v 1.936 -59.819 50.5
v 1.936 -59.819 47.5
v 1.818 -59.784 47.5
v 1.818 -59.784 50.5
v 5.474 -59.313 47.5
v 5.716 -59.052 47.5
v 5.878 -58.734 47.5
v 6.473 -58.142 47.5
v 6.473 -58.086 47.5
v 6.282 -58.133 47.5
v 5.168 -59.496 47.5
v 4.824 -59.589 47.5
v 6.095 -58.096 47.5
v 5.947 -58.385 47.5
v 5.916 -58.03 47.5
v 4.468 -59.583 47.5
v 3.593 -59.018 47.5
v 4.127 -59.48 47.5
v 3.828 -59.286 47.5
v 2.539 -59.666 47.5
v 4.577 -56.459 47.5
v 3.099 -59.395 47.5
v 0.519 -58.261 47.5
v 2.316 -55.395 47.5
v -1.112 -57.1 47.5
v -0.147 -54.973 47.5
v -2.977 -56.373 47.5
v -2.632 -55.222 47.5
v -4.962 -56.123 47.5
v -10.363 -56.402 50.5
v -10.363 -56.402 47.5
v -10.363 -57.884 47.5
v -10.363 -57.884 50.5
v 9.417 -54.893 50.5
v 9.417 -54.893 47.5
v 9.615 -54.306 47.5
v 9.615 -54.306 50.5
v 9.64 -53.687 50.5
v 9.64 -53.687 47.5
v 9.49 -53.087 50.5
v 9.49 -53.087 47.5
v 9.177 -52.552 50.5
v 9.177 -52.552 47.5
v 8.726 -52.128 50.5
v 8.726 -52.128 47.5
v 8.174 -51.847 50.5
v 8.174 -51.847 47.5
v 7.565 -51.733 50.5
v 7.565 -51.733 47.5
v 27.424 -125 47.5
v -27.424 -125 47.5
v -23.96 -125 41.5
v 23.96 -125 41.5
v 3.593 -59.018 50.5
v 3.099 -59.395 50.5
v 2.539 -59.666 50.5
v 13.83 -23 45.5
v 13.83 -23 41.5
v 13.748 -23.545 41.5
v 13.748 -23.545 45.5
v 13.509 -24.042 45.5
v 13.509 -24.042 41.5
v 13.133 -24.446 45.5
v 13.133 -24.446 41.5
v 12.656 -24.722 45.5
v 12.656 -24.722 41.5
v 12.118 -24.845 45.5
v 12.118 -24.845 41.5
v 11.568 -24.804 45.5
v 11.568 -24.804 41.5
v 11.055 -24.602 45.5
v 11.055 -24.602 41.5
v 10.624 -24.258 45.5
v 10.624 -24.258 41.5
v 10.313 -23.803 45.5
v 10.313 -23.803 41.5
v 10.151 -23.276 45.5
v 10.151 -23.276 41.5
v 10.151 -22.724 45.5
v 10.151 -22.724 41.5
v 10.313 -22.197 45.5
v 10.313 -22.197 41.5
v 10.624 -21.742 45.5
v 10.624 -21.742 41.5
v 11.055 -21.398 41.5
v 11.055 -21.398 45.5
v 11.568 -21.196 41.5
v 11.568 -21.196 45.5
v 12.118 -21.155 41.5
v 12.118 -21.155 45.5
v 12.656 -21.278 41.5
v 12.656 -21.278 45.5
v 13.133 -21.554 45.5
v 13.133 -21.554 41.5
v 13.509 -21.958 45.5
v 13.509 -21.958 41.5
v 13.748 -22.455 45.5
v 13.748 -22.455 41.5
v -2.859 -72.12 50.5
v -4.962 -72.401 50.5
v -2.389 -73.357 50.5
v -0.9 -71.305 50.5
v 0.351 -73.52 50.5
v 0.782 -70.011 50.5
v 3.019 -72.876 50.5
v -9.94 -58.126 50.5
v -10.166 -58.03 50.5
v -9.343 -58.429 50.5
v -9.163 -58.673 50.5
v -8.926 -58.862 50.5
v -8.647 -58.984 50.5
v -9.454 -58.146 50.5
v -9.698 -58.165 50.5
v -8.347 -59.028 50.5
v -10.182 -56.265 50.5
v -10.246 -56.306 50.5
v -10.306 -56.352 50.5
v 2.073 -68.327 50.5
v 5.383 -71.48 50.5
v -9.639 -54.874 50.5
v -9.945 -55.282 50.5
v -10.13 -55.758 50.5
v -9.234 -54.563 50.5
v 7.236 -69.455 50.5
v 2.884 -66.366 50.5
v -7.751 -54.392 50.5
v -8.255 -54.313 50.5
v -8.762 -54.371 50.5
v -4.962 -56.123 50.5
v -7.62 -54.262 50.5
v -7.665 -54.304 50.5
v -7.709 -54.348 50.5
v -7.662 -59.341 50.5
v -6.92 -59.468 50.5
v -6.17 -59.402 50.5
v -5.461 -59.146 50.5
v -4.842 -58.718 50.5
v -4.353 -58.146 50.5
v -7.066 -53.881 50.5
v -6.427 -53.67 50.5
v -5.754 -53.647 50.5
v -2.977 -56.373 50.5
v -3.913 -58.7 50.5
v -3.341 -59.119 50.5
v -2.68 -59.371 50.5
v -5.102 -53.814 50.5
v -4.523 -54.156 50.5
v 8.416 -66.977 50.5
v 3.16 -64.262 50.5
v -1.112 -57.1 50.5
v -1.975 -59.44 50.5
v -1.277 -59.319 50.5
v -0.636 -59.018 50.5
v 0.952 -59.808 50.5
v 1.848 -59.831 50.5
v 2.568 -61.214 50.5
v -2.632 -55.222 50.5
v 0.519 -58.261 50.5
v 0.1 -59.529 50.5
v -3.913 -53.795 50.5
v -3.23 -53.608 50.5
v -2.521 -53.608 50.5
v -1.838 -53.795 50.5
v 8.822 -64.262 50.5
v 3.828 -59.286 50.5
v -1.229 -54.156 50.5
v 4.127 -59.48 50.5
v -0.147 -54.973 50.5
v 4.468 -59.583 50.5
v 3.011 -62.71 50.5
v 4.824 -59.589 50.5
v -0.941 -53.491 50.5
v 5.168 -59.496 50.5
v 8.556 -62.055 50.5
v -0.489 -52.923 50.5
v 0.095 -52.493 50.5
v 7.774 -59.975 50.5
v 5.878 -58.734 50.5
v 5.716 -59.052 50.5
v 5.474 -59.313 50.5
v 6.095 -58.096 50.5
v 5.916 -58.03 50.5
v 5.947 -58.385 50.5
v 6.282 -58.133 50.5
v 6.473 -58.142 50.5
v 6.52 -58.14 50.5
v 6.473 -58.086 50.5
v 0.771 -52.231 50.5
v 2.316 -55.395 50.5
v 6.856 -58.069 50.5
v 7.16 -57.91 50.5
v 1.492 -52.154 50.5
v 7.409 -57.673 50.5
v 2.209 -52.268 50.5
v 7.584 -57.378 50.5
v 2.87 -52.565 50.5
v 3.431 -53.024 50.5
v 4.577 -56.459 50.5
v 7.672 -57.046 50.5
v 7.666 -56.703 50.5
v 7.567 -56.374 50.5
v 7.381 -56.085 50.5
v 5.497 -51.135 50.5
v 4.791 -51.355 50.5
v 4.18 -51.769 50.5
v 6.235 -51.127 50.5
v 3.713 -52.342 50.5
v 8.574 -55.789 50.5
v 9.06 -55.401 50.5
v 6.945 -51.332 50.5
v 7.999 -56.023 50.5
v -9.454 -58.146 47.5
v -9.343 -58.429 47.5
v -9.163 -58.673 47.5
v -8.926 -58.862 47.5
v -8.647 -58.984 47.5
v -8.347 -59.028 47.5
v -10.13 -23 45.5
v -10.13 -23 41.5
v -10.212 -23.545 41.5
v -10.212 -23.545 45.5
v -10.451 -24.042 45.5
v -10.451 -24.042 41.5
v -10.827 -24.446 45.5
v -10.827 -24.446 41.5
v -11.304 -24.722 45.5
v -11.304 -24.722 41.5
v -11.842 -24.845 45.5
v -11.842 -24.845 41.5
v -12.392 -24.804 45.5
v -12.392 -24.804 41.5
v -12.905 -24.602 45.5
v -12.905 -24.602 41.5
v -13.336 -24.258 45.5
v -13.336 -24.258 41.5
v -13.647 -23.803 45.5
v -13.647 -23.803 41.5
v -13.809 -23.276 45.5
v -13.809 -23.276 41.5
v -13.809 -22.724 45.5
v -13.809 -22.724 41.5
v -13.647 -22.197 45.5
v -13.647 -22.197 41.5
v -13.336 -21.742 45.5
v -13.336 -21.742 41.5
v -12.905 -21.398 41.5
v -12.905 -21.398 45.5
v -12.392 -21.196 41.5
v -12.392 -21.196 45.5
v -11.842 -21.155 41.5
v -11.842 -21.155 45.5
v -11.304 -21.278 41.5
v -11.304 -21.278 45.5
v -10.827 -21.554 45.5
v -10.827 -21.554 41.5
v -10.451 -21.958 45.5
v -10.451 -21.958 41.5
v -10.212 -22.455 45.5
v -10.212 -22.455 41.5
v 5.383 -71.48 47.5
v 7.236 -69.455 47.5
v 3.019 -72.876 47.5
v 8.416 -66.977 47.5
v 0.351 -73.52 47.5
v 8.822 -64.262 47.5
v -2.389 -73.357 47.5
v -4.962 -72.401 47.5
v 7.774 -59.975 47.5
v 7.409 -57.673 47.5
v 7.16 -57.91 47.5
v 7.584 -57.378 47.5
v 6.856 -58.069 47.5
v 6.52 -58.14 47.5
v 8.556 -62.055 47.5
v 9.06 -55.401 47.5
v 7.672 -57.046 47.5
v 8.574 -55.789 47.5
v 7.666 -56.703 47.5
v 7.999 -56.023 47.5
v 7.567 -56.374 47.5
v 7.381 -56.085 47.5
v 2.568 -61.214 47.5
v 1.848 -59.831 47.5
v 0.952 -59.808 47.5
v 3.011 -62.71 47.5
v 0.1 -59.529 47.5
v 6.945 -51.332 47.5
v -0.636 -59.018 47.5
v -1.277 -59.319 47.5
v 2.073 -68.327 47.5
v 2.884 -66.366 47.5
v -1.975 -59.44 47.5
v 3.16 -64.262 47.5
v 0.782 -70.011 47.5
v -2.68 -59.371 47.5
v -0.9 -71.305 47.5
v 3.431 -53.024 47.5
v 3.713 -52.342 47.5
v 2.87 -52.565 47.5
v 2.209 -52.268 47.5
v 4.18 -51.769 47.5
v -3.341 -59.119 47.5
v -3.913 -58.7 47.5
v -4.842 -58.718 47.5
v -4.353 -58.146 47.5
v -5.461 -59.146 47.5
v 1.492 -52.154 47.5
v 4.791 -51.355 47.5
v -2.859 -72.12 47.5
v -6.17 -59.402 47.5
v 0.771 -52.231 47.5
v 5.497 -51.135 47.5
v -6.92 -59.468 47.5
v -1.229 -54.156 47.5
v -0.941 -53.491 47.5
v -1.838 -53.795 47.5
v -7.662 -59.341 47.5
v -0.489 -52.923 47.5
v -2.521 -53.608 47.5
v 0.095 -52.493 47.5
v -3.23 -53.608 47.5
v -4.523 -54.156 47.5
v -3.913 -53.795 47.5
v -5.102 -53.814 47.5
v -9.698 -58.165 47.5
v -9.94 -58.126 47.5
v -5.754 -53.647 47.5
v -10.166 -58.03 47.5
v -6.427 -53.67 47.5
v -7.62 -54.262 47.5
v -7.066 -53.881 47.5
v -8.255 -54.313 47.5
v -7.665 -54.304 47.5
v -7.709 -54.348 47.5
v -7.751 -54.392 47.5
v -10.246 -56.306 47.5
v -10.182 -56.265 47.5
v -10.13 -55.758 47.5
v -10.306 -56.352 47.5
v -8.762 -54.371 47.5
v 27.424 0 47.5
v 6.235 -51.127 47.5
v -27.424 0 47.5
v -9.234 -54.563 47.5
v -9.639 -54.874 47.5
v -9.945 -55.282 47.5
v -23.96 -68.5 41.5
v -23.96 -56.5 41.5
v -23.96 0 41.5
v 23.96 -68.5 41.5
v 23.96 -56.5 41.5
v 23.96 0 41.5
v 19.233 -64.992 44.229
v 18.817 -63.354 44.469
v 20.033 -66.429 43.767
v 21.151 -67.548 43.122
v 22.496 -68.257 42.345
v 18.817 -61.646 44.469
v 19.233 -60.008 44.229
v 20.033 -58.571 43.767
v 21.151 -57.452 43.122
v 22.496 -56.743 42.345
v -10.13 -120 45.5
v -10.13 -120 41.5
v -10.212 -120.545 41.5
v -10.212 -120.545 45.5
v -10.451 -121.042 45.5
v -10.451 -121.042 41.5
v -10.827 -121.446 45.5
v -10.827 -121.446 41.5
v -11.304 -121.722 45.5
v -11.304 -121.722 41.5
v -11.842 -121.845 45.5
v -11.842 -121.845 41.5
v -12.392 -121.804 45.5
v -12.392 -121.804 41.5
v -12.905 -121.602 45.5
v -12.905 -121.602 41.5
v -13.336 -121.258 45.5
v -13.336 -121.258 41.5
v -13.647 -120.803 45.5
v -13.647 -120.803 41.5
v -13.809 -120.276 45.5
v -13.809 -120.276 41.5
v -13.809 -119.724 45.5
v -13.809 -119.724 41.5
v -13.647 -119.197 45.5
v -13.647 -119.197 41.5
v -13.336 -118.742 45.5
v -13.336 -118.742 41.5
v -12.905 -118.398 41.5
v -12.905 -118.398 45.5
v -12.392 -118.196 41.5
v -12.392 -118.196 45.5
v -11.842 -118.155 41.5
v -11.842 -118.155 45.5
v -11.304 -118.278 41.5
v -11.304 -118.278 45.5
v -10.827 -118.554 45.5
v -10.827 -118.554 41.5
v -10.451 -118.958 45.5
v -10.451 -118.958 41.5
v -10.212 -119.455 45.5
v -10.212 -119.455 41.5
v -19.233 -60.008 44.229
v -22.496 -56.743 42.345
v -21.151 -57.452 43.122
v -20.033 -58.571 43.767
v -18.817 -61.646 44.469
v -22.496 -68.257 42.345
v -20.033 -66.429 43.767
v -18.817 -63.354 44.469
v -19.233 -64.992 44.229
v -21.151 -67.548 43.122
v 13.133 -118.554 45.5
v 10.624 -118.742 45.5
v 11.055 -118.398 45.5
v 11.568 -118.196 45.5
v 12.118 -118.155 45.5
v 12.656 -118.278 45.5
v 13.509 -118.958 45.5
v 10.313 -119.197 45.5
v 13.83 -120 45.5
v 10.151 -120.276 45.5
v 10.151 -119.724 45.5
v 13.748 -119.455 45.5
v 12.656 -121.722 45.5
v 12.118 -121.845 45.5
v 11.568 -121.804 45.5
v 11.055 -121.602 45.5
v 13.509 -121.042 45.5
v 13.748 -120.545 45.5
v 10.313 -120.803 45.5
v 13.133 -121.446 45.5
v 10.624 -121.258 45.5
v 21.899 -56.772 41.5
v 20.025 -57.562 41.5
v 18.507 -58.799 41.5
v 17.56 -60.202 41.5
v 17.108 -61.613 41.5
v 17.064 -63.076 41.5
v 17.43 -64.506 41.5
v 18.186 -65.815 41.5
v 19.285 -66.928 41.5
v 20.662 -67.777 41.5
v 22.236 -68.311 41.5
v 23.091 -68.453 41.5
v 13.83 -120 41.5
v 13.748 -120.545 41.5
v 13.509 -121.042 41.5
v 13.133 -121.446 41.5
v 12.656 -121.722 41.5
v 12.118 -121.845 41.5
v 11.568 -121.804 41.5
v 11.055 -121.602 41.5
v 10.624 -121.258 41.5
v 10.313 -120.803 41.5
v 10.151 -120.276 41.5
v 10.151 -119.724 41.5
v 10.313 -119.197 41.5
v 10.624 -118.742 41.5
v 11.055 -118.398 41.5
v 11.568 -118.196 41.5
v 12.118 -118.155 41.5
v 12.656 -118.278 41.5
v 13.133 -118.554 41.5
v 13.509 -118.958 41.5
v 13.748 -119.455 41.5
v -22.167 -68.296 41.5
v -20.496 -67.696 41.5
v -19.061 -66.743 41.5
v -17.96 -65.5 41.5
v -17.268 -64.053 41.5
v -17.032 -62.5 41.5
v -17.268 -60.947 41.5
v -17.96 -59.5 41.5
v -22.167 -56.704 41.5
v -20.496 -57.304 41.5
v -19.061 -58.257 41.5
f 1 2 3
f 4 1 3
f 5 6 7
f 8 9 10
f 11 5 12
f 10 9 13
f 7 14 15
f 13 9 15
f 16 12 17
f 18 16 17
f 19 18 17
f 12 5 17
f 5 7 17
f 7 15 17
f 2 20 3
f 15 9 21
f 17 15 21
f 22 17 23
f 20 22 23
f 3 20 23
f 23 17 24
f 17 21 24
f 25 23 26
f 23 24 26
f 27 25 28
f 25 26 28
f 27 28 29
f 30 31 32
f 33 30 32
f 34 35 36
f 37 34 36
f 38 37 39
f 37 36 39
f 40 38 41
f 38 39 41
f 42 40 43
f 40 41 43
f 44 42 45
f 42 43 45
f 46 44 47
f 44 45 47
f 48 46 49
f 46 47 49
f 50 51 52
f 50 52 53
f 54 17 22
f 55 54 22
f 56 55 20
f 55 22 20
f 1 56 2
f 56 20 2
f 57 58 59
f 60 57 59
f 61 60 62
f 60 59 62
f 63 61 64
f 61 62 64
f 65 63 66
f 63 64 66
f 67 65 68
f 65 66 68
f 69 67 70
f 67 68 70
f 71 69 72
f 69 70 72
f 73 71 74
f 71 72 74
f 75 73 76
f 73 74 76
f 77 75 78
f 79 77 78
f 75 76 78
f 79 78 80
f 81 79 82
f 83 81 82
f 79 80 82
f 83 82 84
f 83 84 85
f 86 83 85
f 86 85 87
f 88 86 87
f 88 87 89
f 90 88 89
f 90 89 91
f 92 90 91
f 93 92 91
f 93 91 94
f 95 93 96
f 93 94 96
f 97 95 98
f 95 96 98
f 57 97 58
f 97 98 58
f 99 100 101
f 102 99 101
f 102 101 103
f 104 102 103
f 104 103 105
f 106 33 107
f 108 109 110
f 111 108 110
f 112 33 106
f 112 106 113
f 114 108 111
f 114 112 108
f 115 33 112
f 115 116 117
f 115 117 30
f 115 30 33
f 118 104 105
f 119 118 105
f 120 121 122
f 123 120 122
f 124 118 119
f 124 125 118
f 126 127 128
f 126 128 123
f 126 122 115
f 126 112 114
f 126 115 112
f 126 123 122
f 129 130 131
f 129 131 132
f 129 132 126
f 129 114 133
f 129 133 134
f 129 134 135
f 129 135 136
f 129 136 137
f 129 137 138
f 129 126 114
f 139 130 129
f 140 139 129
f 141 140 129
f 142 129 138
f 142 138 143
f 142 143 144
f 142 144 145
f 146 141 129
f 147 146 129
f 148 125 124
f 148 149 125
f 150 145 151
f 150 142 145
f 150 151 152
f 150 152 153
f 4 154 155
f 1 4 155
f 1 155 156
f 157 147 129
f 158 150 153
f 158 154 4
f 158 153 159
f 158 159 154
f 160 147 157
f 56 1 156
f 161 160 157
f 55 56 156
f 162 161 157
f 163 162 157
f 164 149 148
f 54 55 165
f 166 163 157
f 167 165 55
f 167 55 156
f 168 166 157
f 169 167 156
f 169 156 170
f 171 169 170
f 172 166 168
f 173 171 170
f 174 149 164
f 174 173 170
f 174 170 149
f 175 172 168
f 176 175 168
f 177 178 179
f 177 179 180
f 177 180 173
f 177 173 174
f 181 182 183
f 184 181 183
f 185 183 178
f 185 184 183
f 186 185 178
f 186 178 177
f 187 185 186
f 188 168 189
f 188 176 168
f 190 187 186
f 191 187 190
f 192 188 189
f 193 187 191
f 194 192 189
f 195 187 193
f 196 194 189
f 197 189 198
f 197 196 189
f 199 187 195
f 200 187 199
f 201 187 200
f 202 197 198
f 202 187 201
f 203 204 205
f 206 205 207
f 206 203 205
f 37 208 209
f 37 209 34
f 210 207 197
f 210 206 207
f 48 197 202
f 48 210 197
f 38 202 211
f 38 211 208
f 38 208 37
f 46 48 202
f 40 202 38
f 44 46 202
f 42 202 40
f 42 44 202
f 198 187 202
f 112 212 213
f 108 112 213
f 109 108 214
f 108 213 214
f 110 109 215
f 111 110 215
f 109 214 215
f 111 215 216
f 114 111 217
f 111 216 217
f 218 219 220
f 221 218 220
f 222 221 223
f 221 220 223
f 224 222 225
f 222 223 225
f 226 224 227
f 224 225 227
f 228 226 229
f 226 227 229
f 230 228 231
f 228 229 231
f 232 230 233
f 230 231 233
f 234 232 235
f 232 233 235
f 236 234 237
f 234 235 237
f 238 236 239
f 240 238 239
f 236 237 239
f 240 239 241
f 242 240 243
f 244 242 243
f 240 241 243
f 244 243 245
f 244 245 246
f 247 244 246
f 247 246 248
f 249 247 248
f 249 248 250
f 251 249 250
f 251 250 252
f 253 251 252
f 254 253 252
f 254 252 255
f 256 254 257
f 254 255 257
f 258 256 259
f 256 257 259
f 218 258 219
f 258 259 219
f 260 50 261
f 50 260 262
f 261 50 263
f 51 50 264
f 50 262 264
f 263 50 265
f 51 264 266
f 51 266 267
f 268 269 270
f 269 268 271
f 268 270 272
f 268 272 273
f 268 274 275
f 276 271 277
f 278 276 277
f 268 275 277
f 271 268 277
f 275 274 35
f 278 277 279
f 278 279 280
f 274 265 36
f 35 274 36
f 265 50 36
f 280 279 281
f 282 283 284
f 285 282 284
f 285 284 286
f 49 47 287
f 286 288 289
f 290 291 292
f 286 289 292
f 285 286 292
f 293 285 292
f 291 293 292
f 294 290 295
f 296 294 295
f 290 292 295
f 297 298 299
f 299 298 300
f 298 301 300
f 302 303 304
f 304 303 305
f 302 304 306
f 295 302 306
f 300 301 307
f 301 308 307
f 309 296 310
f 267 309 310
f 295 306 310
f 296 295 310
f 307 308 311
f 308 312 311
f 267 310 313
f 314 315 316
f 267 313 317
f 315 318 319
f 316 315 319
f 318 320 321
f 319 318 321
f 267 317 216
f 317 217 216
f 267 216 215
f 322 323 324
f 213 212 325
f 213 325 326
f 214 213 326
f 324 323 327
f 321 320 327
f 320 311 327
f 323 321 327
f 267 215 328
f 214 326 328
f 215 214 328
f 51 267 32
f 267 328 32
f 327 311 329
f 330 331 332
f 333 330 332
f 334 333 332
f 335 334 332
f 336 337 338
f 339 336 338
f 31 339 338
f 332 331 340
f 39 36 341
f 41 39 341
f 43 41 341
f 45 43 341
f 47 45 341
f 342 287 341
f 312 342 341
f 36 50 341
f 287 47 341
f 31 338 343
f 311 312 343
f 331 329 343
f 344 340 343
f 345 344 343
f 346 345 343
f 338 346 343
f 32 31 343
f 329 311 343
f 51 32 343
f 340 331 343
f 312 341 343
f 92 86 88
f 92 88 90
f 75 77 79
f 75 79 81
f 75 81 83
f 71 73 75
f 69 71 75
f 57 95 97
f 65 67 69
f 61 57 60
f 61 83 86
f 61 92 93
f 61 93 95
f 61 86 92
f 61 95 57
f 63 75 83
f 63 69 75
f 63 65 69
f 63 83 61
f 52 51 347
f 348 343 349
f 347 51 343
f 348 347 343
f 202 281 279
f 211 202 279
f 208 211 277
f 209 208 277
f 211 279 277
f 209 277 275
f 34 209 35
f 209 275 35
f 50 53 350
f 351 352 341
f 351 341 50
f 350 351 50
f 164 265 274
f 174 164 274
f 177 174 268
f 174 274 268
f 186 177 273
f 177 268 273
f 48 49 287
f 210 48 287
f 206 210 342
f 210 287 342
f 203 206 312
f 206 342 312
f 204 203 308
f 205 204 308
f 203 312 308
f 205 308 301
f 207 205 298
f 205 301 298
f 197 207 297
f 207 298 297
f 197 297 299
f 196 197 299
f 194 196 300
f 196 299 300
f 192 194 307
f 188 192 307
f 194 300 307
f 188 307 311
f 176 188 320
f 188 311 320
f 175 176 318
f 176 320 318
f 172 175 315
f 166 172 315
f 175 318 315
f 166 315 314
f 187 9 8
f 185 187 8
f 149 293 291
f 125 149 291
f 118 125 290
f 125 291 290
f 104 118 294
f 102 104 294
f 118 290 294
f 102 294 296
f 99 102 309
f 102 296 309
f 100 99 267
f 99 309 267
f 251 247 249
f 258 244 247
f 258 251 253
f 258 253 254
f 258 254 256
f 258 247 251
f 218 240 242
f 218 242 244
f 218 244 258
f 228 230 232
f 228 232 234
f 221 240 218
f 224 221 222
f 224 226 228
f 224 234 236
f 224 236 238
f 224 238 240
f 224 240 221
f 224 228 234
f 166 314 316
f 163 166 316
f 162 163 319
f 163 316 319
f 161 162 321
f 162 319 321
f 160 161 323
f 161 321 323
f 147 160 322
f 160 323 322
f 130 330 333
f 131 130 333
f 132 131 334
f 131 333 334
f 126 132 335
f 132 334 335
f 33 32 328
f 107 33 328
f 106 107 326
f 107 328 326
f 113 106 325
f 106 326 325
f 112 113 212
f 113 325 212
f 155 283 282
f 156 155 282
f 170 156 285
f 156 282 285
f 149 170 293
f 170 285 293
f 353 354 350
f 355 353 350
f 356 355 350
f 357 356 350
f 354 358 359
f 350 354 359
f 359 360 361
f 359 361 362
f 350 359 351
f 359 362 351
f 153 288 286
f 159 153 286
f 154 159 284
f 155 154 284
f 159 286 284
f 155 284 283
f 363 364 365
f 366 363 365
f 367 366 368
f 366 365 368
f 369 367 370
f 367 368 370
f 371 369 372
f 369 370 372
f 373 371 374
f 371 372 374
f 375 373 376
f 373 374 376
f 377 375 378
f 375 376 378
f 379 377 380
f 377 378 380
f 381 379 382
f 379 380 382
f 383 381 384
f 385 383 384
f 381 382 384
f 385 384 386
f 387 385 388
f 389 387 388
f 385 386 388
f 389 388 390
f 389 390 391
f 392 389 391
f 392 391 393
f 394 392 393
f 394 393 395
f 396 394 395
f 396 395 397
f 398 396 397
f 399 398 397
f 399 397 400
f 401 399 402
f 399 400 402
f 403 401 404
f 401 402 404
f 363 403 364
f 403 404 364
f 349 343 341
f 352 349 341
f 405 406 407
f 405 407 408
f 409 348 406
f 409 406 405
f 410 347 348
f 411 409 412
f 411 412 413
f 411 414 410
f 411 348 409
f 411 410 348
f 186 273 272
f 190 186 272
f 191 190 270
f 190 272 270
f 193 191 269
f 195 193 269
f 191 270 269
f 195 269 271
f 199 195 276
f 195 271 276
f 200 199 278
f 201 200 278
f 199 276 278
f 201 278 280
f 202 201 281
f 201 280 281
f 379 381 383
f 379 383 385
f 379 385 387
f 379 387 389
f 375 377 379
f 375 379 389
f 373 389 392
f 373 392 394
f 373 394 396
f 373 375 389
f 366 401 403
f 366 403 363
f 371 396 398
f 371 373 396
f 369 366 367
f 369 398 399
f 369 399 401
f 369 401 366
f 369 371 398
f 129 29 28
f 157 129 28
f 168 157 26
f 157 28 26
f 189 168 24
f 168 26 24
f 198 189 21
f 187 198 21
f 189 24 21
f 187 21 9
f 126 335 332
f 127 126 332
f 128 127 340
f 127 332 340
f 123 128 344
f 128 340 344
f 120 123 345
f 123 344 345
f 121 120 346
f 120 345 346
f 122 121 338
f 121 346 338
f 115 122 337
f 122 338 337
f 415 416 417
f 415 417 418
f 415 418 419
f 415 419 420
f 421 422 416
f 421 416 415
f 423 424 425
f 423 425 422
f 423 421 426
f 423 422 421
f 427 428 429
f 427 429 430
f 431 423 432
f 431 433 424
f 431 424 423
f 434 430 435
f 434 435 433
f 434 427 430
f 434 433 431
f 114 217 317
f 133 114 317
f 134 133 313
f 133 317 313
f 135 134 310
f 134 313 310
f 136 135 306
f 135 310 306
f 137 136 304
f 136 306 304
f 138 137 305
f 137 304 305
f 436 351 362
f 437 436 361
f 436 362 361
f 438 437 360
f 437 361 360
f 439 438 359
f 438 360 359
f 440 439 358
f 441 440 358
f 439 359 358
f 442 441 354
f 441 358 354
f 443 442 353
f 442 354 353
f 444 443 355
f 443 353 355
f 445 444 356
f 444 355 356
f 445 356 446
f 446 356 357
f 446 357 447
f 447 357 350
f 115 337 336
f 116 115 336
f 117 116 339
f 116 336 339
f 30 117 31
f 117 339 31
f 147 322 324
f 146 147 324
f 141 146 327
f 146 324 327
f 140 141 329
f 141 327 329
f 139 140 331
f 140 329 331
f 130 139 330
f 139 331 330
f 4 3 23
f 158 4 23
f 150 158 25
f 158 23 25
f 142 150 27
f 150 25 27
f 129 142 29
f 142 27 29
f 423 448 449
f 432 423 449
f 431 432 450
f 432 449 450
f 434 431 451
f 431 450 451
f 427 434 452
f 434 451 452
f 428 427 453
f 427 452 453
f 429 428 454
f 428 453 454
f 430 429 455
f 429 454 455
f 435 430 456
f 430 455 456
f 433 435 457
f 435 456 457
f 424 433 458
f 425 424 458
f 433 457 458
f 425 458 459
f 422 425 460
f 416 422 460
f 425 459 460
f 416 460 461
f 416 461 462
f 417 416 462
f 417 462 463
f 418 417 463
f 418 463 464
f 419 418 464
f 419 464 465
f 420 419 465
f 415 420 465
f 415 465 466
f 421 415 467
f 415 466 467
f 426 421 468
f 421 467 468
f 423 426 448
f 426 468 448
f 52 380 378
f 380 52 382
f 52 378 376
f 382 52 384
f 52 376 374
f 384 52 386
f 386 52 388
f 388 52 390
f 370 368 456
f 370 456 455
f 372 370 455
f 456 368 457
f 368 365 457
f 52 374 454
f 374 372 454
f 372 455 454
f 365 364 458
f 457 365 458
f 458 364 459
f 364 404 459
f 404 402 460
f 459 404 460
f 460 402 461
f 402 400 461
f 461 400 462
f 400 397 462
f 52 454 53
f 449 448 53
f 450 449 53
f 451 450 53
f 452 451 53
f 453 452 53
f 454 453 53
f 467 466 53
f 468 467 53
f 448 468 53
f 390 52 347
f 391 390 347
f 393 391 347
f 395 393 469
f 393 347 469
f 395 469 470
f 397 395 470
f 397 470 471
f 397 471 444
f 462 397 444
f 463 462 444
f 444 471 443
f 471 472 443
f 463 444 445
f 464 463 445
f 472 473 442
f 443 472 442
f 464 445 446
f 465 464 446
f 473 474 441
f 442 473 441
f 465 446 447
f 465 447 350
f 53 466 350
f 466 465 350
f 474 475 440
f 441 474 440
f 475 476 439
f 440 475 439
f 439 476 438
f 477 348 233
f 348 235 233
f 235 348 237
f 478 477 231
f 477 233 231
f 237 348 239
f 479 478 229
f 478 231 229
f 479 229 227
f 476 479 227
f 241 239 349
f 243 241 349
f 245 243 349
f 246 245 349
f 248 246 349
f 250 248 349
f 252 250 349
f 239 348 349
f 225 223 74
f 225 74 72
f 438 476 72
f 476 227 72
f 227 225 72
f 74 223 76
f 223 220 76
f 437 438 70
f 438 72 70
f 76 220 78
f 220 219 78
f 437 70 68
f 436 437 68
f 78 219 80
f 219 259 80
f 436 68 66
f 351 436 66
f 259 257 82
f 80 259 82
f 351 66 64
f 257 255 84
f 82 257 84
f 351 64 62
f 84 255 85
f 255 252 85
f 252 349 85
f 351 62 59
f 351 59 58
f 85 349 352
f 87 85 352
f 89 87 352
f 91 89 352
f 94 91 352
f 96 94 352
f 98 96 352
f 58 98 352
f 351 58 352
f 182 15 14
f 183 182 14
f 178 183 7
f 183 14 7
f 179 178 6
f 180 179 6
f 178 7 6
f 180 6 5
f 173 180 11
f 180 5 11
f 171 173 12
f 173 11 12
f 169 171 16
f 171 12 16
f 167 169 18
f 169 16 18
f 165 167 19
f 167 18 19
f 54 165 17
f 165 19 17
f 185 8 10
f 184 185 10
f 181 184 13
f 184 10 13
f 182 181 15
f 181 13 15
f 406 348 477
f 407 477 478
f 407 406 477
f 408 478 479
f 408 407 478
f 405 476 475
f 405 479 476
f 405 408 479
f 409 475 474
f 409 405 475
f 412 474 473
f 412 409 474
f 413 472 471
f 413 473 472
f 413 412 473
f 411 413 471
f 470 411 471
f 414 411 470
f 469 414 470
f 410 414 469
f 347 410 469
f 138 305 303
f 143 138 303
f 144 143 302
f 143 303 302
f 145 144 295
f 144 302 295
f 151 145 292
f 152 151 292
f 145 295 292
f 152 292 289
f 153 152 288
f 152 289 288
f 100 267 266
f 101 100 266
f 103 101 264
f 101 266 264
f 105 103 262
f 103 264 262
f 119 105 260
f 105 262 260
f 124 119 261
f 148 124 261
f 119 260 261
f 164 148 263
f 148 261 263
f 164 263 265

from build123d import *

# Parameters (mm, degrees)
F1_DEPTH  = 125
F2_R      = 1.85
F3_DEPTH  = 4
F5_DEPTH  = 3
F7_R      = 6
F8_DEPTH  = 25
F10_R     = 6
F11_DEPTH = 25


with BuildPart() as f1:
    # F0 (on Front) → F1 (new body)
    with BuildSketch(Plane.XZ):
        Polygon((27.4241377865, 47.5), (-27.4241377865, 47.5), (-23.9600361714, 41.5), (23.9600361714, 41.5), align=None)
    extrude(amount=F1_DEPTH)

    # F2 (on face) → F3 (cut)
    with BuildSketch(Plane(origin=(0, 0, 41.5), x_dir=(1, 0, 0), z_dir=(0, 0, -1))):
        with BuildLine():
            ThreePointArc((-13.8300180857, 120), (-11.9800180857, 118.15), (-10.1300180857, 120))
            Line((-10.1300180857, 120), (-13.8300180857, 120))
        make_face()
        with BuildLine():
            Line((-13.8300180857, 120), (-10.1300180857, 120))
            ThreePointArc((-10.1300180857, 120), (-11.9800180857, 121.85), (-13.8300180857, 120))
        make_face()
        with Locations((11.9800180857, 120)):
            Circle(F2_R)
        with BuildLine():
            ThreePointArc((-13.8300180857, 23), (-11.9800180857, 21.15), (-10.1300180857, 23))
            Line((-10.1300180857, 23), (-13.8300180857, 23))
        make_face()
        with BuildLine():
            Line((-13.8300180857, 23), (-10.1300180857, 23))
            ThreePointArc((-10.1300180857, 23), (-11.9800180857, 24.85), (-13.8300180857, 23))
        make_face()
        with Locations((11.9800180857, 23)):
            Circle(F2_R)
    extrude(amount=-F3_DEPTH, mode=Mode.SUBTRACT)

    # F4 (on face) → F5 (join)
    with BuildSketch(Plane.XY.offset(47.5)):
        with BuildLine():
            ThreePointArc((-4.9624431031, -72.4009279721), (4.252691201, -72.2658826822), (8.8217126606, -64.2620723161))
            Line((8.8217126606, -64.2620723161), (3.1603222234, -64.2620723161))
            ThreePointArc((3.1603222234, -64.2620723161), (0.7821935357, -70.0114263654), (-4.9624431031, -72.4009279721))
        make_face()
        with BuildLine():
            ThreePointArc((6.5204872228, -58.1396910508), (6.4966065006, -58.1411162683), (6.4727028262, -58.142082959))
            ThreePointArc((6.4727028262, -58.142082959), (6.1878056278, -58.118065532), (5.9158733115, -58.0297701993))
            ThreePointArc((5.9158733115, -58.0297701993), (5.1682662368, -59.4962219445), (3.5931775857, -59.0182127392))
            ThreePointArc((3.5931775857, -59.0182127392), (2.8253831829, -59.5446151282), (1.9358127946, -59.8189730046))
            ThreePointArc((1.9358127946, -59.8189730046), (1.892061339, -59.8251878066), (1.8482256331, -59.8307774863))
            ThreePointArc((1.8482256331, -59.8307774863), (2.8254071893, -61.9513380534), (3.1603222234, -64.2620723161))
            Line((3.1603222234, -64.2620723161), (8.8217126606, -64.2620723161))
            ThreePointArc((8.8217126606, -64.2620723161), (8.227406593, -60.991782158), (6.5204872228, -58.1396910508))
        make_face()
        with BuildLine():
            ThreePointArc((-4.9624431031, -56.1232166602), (1.0988983628, -55.1011074623), (6.4727028262, -58.0855325605))
            ThreePointArc((6.4727028262, -58.0855325605), (6.4966476292, -58.1125653923), (6.5204872228, -58.1396910508))
            ThreePointArc((6.5204872228, -58.1396910508), (7.5840164309, -57.3778876345), (7.3813630468, -56.0854595214))
            ThreePointArc((7.3813630468, -56.0854595214), (8.5743392283, -55.7885482621), (9.416500561, -54.8929407838))
            Line((9.416500561, -54.8929407838), (9.416500561, -54.2620723161))
            Line((9.416500561, -54.2620723161), (-7.6202011075, -54.2620723161))
            ThreePointArc((-7.6202011075, -54.2620723161), (-7.6869328379, -54.3259904491), (-7.7511294791, -54.3924542951))
            ThreePointArc((-7.7511294791, -54.3924542951), (-9.4471027568, -54.7050419938), (-10.1823136256, -56.265010393))
            ThreePointArc((-10.1823136256, -56.265010393), (-10.2763805171, -56.3286177025), (-10.3628188483, -56.4022579415))
            Line((-10.3628188483, -56.4022579415), (-10.3628188483, -57.883753756))
            ThreePointArc((-10.3628188483, -57.883753756), (-9.9403916974, -58.1260840744), (-9.453785384, -58.1456538666))
            ThreePointArc((-9.453785384, -58.1456538666), (-9.0506628028, -58.7755881179), (-8.3467504152, -59.0282387207))
            ThreePointArc((-8.3467504152, -59.0282387207), (-6.1696577071, -59.4019534475), (-4.3527629056, -58.1456538666))
            ThreePointArc((-4.3527629056, -58.1456538666), (-2.6797742551, -59.371466197), (-0.6360720047, -59.0182127392))
            ThreePointArc((-0.6360720047, -59.0182127392), (0.5161185349, -59.6995293687), (1.8482256331, -59.8307774863))
            ThreePointArc((1.8482256331, -59.8307774863), (1.8330187957, -59.8074376583), (1.817732163, -59.7841500149))
            ThreePointArc((1.817732163, -59.7841500149), (-1.111668826, -57.1004757298), (-4.9624431031, -56.1232166602))
        make_face()
        with BuildLine():
            Line((9.416500561, -54.2620723161), (9.416500561, -54.8929407838))
            ThreePointArc((9.416500561, -54.8929407838), (9.352384363, -52.8082417308), (7.5650540132, -51.7332853367))
            ThreePointArc((7.5650540132, -51.7332853367), (5.1359618237, -51.2192554799), (3.4312824519, -53.0244656611))
            ThreePointArc((3.4312824519, -53.0244656611), (0.771209683, -52.2310388329), (-1.2286664372, -54.1561385113))
            ThreePointArc((-1.2286664372, -54.1561385113), (-2.8757088862, -53.5841315132), (-4.5227513352, -54.1561385113))
            ThreePointArc((-4.5227513352, -54.1561385113), (-6.0911184928, -53.634775536), (-7.6202011075, -54.2620723161))
            Line((-7.6202011075, -54.2620723161), (9.416500561, -54.2620723161))
        make_face()
        with BuildLine():
            Line((1.9358127946, -59.8189730046), (1.817732163, -59.7841500149))
            ThreePointArc((1.817732163, -59.7841500149), (1.8330187957, -59.8074376583), (1.8482256331, -59.8307774863))
            ThreePointArc((1.8482256331, -59.8307774863), (1.892061339, -59.8251878066), (1.9358127946, -59.8189730046))
        make_face()
        with BuildLine():
            Line((6.4727028262, -58.0855325605), (6.4727028262, -58.142082959))
            ThreePointArc((6.4727028262, -58.142082959), (6.4966065006, -58.1411162683), (6.5204872228, -58.1396910508))
            ThreePointArc((6.5204872228, -58.1396910508), (6.4966476292, -58.1125653923), (6.4727028262, -58.0855325605))
        make_face()
    extrude(amount=F5_DEPTH)

    # F7 (on face) → F8 (cut)
    with BuildSketch(Plane(origin=(-23.9600361714, 0, 41.5), x_dir=(0.8660254038, 0, 0.5), z_dir=(0.5, 0, -0.8660254038))):
        with Locations((0, 62.5)):
            Circle(F7_R)
    extrude(amount=F8_DEPTH, mode=Mode.SUBTRACT)

    # F10 (on face) → F11 (cut)
    with BuildSketch(Plane(origin=(23.9600361714, 0, 41.5), x_dir=(0.8660254038, 0, -0.5), z_dir=(0.5, 0, 0.8660254038))):
        with Locations((0, -62.5)):
            Circle(F10_R)
    extrude(amount=-F11_DEPTH, mode=Mode.SUBTRACT)


solid = f1.part
